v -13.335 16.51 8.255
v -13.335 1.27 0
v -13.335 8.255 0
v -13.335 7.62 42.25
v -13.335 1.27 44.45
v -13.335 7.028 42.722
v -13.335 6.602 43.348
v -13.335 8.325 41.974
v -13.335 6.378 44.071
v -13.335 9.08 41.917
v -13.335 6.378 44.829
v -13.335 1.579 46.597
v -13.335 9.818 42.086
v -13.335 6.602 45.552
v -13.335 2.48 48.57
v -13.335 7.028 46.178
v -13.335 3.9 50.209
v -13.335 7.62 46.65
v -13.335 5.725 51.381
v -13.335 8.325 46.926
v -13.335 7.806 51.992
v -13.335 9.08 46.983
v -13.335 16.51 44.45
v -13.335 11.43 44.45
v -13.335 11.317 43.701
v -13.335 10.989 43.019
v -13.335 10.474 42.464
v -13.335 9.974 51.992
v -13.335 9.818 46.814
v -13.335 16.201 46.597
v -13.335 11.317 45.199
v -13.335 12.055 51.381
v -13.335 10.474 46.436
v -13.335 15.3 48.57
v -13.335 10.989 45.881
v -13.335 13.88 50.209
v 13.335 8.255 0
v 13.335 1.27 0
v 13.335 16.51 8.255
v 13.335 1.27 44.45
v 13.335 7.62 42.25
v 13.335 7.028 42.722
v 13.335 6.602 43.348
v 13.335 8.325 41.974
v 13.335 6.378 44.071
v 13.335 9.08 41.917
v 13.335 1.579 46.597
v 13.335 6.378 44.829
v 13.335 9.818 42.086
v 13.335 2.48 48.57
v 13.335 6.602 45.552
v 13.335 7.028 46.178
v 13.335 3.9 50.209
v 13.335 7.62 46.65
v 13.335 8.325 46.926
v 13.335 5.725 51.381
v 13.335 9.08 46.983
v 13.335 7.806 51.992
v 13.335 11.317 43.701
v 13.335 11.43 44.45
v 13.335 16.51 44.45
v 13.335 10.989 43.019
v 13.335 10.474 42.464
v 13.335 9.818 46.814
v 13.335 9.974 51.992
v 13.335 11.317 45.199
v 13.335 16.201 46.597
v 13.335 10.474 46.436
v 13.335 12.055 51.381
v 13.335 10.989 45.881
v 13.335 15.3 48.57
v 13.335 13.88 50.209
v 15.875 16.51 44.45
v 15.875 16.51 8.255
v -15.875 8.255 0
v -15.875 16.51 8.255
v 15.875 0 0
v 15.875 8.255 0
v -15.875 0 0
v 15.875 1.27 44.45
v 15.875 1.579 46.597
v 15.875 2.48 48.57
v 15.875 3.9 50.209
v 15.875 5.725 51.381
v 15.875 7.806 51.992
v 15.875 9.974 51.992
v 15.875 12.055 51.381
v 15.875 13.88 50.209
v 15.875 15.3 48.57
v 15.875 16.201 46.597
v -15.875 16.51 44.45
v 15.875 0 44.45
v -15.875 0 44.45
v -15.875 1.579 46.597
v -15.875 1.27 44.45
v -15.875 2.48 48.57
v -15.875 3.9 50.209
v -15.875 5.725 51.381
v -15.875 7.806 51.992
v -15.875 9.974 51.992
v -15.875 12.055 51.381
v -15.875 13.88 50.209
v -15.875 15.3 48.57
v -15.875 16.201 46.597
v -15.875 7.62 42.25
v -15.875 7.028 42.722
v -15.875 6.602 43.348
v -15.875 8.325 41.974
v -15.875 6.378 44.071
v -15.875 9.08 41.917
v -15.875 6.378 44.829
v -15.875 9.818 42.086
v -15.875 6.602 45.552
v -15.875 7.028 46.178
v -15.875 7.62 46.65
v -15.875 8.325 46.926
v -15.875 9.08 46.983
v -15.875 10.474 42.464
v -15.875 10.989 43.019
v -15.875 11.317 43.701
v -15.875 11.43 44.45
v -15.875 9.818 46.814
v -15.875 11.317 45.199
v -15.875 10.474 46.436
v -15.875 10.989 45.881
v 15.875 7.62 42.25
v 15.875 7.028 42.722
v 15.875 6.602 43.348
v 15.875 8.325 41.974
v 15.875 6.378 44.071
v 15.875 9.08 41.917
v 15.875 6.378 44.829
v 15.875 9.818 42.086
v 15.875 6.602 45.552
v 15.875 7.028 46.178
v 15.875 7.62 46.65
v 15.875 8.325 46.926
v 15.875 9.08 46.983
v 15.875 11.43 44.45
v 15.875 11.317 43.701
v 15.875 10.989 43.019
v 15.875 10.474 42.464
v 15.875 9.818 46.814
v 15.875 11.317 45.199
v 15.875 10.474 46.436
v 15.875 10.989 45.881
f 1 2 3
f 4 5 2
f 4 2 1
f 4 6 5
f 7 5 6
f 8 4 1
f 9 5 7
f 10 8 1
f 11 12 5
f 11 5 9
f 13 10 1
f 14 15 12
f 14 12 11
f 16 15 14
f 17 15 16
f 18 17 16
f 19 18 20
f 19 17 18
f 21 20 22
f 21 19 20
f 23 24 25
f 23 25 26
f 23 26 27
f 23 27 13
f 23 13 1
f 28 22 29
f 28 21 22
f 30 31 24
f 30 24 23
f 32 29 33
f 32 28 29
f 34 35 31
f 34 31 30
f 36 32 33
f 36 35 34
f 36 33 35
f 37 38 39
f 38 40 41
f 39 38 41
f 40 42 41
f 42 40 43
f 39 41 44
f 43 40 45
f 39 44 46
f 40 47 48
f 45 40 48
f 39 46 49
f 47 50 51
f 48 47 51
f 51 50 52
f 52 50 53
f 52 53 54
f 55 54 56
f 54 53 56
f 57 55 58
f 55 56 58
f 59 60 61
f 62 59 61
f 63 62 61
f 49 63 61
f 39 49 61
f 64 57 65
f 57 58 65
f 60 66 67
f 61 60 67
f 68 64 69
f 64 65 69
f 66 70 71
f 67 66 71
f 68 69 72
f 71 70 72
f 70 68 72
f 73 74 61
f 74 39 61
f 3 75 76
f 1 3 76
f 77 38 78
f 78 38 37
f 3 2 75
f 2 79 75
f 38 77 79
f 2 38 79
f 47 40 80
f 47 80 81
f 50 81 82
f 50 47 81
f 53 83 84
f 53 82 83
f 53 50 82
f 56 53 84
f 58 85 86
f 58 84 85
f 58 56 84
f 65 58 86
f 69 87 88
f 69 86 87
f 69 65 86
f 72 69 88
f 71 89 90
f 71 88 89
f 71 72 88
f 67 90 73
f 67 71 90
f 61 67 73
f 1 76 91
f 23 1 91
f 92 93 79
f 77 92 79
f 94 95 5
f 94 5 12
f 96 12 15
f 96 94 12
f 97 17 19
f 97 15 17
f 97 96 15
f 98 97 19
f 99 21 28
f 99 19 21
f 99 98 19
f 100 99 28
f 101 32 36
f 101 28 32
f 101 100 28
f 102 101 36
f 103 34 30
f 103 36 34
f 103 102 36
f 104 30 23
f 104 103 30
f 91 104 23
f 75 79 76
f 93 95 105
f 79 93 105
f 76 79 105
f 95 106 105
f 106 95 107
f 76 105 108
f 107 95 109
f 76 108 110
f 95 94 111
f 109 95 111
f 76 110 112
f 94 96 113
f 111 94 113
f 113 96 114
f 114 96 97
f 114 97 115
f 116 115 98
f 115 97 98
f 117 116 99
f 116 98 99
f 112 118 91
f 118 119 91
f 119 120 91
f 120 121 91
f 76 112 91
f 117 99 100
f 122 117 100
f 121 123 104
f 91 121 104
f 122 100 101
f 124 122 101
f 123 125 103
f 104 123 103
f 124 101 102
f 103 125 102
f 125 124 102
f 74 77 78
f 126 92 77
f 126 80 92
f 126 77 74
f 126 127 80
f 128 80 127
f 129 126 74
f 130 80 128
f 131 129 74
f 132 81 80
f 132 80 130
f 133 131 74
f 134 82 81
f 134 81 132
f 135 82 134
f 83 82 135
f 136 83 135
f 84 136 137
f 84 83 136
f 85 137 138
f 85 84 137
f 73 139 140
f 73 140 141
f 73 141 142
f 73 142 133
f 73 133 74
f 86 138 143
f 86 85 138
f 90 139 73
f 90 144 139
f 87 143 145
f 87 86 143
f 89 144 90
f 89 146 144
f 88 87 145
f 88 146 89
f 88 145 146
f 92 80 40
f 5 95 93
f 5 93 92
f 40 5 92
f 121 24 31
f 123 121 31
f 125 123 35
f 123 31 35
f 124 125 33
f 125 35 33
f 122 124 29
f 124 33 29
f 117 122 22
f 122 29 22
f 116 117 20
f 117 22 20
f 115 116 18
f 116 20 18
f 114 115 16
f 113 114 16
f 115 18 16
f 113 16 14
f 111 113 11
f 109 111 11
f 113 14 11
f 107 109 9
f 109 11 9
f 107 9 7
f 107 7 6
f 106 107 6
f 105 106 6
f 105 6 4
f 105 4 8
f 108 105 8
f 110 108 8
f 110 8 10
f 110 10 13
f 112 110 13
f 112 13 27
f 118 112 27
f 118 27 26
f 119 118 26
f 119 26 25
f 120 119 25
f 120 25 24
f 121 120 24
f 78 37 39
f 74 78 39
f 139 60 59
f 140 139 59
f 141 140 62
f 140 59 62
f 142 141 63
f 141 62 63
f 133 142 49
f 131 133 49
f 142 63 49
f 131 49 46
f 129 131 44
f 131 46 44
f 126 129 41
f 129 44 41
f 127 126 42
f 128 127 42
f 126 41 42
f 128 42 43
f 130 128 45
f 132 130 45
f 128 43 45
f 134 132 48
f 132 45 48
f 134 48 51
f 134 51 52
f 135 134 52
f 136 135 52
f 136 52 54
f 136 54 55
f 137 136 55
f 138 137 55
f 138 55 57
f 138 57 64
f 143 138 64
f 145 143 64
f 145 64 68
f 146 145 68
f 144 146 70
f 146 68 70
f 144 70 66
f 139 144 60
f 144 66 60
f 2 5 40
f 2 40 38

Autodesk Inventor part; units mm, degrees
ref_plane "YZ Plane" through (0, 0, 0) normal (1, 0, 0) x (0, 1, 0)
ref_plane "XZ Plane" through (0, 0, 0) normal (0, 1, 0) x (-1, 0, 0)
ref_plane "XY Plane" through (0, 0, 0) normal (0, 0, 1) x (1, 0, 0)
sketch "Sketch1" plane through (0, 0, 0) normal (1, 0, 0) x (0, 1, 0)
  line L0 (0, 0) -> (16.51, 0)
  line L1 (16.51, 0) -> (16.51, 44.45)
  line L2 (16.51, 44.45) -> (0, 44.45)
  line L3 (0, 44.45) -> (0, 0)
  line L4 (1.27, 44.45) -> (1.27, 0)
  circle A0 centre (8.89, 44.45) radius 7.62
  line L5 (0, 44.45) -> (2.3586, 48.3749)
  circle A1 centre (8.89, 44.45) radius 2.54
  line L6 (8.255, 0) -> (16.51, 8.255)
  dimension "d2" = 15.24
  dimension "d0" = 44.45
  dimension "d1" = 1.27
  dimension "d3" = 7.62
  dimension "d4" = 5.08
  dimension "d5" = 45
extrude "Extrusion1" add sketch "Sketch1" along normal mid plane 31.75 contours L3 L2 L4 L0 | L4 A0 L1 L6 L0 | A0 L2 A1 | L2 A1 A0 | A1 L2 | L2 A1
extrude "Extrusion2" cut sketch "Sketch1" along normal through all both and the other way through all contours A1 L2 | L2 A1
extrude "Extrusion3" cut sketch "Sketch1" along normal mid plane 26.67 contours L4 A0 L1 L6 L0 | A0 L2 A1 | L2 A1 A0 | L2 A1 picked at (9.5237, 43.4833)
equation "\"d3\" = 0.5 * d2"
properties part number "LegHolderV2"
